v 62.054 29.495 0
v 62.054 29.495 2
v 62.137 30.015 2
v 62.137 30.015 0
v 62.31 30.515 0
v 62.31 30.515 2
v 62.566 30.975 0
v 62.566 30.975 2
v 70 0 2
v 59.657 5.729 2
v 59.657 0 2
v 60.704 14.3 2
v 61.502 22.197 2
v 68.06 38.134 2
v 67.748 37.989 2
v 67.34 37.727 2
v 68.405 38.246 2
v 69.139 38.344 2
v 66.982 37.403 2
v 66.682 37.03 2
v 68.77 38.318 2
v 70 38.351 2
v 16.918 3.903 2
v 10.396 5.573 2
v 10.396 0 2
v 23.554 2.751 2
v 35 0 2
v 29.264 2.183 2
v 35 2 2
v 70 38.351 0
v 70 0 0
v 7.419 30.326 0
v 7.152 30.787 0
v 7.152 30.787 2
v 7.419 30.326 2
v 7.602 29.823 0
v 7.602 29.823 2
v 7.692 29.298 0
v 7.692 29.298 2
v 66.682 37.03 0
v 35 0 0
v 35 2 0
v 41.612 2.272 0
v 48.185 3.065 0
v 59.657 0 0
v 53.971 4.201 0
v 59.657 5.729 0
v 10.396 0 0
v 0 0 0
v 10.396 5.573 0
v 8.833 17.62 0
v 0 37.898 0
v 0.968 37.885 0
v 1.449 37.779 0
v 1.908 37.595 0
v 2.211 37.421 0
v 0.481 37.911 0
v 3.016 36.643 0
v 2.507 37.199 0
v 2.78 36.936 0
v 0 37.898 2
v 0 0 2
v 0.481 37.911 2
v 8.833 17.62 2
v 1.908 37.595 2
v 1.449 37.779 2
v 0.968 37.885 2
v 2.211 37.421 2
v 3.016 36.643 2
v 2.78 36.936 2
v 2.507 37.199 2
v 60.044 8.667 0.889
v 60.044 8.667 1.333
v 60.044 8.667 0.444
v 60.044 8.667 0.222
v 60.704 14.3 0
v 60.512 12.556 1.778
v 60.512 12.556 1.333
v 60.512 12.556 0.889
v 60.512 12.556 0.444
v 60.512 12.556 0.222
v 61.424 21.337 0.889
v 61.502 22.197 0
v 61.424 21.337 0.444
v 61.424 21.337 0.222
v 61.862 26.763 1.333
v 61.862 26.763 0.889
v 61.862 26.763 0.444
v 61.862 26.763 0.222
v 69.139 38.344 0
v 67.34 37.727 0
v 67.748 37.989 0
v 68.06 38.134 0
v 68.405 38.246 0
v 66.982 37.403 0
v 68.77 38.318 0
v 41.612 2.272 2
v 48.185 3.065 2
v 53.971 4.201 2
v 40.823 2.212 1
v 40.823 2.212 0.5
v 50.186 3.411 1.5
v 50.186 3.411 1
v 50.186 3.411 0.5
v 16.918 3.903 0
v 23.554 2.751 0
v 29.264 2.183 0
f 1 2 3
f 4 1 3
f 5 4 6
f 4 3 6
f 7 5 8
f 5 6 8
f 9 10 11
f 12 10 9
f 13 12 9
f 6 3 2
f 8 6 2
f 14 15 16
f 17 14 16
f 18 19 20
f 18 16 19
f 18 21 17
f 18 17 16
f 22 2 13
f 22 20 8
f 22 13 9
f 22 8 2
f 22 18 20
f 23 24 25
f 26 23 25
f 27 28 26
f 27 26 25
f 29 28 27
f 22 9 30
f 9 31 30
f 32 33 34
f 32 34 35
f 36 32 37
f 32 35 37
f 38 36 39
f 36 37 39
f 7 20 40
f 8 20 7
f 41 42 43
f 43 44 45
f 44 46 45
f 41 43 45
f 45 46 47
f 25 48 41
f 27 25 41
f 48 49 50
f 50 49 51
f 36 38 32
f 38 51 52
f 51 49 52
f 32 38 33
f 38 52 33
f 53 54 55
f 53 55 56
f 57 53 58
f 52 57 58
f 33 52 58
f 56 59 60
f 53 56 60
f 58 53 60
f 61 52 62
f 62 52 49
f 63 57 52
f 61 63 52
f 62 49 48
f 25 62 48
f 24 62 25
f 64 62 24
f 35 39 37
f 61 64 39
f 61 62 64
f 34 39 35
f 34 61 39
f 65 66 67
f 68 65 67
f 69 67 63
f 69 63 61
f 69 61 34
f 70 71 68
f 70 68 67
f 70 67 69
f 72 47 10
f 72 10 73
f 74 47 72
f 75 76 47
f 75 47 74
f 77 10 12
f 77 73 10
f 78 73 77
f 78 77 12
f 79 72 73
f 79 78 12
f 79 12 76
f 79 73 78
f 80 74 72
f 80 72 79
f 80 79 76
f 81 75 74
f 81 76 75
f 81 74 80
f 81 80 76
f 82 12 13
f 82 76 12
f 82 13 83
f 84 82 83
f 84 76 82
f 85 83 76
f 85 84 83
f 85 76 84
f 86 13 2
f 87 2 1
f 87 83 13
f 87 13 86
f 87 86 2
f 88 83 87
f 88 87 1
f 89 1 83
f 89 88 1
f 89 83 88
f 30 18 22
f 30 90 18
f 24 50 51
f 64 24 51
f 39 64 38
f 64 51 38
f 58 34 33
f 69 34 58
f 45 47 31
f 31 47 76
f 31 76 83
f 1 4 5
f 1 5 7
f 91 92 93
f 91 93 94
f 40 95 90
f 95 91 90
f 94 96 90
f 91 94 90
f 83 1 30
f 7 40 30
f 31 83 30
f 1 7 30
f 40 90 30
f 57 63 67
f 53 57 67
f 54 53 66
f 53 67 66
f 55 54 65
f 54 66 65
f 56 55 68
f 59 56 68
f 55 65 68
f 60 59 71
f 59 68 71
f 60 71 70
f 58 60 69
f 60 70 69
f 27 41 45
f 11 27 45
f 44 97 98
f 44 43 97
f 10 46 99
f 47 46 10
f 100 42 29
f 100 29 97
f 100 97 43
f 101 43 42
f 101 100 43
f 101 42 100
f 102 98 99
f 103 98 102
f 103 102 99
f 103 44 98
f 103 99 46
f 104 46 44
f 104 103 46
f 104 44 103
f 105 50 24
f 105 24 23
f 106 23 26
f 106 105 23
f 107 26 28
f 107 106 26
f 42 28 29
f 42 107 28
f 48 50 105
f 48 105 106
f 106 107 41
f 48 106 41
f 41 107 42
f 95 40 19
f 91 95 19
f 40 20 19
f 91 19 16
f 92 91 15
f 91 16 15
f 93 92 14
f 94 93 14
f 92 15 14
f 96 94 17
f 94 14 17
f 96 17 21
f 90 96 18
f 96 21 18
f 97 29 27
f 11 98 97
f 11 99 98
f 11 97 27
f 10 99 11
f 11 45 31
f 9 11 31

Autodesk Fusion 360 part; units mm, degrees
sketch "Sketch1" plane through (0, 0, 0) normal (0, 0, 1) x (1, 0, 0)
  line L0 (0, 0) -> (70, 0)
  line L1 (70, 0) -> (70, 70)
  line L2 (70, 70) -> (0, 70)
  line L3 (0, 70) -> (0, 0)
  line L4 (35, 0) -> (35, 2)
  line L5 (7.0862, 38.0966) -> (-0.0002, 37.8975)
  spline S0 degree 3 poles (10.3955, 5.5731) (10.3802, 5.6793) (10.3649, 5.7855) (10.3496, 5.8917) (9.0883, 14.6436) (8.1004, 23.4498) (7.4637, 32.2724) (7.3237, 34.2127) (7.1982, 36.1541) (7.0862, 38.0966) knots -0.009814 -0.009814 -0.009814 -0.009814 0 0 0 0.807859 0.807859 0.807859 0.985531 0.985531 0.985531 0.985531
  spline S1 degree 3 poles (10.3955, 5.5731) (10.4984, 5.5428) (10.6014, 5.5124) (10.7043, 5.4821) (20.4404, 2.6148) (30.6917, 1.4904) (40.8231, 2.2123) (47.1025, 2.6598) (53.3356, 3.8196) (59.3506, 5.6366) (59.4527, 5.6674) (59.5548, 5.6983) (59.6569, 5.7291) knots -0.006564 -0.006564 -0.006564 -0.006564 0 0 0 0.617362 0.617362 0.617362 1 1 1 1.006532 1.006532 1.006532 1.006532
  spline S2 degree 3 poles (59.6569, 5.7291) (59.6713, 5.8348) (59.6858, 5.9405) (59.7002, 6.0462) (59.8076, 6.8337) (59.9283, 7.7587) (60.0441, 8.6669) (60.1266, 9.3143) (60.1999, 9.8958) (60.2654, 10.4307) (60.3347, 10.9971) (60.4027, 11.5764) (60.5122, 12.5559) (60.6287, 13.5983) (60.7932, 15.1018) (60.9645, 16.7322) (61.1308, 18.3151) (61.2956, 19.9486) (61.4243, 21.3369) (61.6198, 23.4449) (61.7373, 25.0266) (61.8616, 26.7626) (61.984, 28.4714) (62.1188, 30.3815) (62.2431, 32.3181) (62.3758, 34.386) (62.4877, 36.4096) (62.5659, 38.2906) knots -0.017354 -0.017354 -0.017354 -0.017354 0 0 0 0.129003 0.129003 0.129003 0.22097 0.22097 0.22097 0.318349 0.318349 0.318349 0.421987 0.421987 0.421987 0.522602 0.522602 0.522602 0.675374 0.675374 0.675374 0.825748 0.825748 0.825748 0.986316 0.986316 0.986316 0.986316
  line L6 (62.5659, 38.2906) -> (70, 38.3506)
  line L7 (10.3955, 5.5731) -> (10.3955, 0)
  line L8 (59.6569, 5.7291) -> (59.6569, 0)
  dimension "d2" = 70
  dimension "d3" = 70
  dimension "d4" = 2
extrude "Extrude1" add sketch "Sketch1" along normal blind 2 contours L0 L3 L5 S0 L7 | L0 L4 S1 L7 | L0 L4 S1 L8 | L0 L1 S2 L6 L8
chamfer "Chamfer2" distance 5 distance2 8 1 edges at (62.5659, 38.2906, 1) measured on face at (65.0439, 38.3106, 0.6667)
chamfer "Chamfer2" distance 8 distance2 5 1 edges at (7.0862, 38.0966, 1) measured on face at (9.6377, 11.0613, 0.6667)
fillet "Fillet3" radius 3 4 edges at (67.5657, 38.3309, 1) (62.1098, 30.3036, 1) (7.6264, 30.1149, 1) (2.0882, 37.9562, 1)
equation "Box_width = 70 mm"
equation "d2 = Box_width"
equation "d3 = Box_width"
